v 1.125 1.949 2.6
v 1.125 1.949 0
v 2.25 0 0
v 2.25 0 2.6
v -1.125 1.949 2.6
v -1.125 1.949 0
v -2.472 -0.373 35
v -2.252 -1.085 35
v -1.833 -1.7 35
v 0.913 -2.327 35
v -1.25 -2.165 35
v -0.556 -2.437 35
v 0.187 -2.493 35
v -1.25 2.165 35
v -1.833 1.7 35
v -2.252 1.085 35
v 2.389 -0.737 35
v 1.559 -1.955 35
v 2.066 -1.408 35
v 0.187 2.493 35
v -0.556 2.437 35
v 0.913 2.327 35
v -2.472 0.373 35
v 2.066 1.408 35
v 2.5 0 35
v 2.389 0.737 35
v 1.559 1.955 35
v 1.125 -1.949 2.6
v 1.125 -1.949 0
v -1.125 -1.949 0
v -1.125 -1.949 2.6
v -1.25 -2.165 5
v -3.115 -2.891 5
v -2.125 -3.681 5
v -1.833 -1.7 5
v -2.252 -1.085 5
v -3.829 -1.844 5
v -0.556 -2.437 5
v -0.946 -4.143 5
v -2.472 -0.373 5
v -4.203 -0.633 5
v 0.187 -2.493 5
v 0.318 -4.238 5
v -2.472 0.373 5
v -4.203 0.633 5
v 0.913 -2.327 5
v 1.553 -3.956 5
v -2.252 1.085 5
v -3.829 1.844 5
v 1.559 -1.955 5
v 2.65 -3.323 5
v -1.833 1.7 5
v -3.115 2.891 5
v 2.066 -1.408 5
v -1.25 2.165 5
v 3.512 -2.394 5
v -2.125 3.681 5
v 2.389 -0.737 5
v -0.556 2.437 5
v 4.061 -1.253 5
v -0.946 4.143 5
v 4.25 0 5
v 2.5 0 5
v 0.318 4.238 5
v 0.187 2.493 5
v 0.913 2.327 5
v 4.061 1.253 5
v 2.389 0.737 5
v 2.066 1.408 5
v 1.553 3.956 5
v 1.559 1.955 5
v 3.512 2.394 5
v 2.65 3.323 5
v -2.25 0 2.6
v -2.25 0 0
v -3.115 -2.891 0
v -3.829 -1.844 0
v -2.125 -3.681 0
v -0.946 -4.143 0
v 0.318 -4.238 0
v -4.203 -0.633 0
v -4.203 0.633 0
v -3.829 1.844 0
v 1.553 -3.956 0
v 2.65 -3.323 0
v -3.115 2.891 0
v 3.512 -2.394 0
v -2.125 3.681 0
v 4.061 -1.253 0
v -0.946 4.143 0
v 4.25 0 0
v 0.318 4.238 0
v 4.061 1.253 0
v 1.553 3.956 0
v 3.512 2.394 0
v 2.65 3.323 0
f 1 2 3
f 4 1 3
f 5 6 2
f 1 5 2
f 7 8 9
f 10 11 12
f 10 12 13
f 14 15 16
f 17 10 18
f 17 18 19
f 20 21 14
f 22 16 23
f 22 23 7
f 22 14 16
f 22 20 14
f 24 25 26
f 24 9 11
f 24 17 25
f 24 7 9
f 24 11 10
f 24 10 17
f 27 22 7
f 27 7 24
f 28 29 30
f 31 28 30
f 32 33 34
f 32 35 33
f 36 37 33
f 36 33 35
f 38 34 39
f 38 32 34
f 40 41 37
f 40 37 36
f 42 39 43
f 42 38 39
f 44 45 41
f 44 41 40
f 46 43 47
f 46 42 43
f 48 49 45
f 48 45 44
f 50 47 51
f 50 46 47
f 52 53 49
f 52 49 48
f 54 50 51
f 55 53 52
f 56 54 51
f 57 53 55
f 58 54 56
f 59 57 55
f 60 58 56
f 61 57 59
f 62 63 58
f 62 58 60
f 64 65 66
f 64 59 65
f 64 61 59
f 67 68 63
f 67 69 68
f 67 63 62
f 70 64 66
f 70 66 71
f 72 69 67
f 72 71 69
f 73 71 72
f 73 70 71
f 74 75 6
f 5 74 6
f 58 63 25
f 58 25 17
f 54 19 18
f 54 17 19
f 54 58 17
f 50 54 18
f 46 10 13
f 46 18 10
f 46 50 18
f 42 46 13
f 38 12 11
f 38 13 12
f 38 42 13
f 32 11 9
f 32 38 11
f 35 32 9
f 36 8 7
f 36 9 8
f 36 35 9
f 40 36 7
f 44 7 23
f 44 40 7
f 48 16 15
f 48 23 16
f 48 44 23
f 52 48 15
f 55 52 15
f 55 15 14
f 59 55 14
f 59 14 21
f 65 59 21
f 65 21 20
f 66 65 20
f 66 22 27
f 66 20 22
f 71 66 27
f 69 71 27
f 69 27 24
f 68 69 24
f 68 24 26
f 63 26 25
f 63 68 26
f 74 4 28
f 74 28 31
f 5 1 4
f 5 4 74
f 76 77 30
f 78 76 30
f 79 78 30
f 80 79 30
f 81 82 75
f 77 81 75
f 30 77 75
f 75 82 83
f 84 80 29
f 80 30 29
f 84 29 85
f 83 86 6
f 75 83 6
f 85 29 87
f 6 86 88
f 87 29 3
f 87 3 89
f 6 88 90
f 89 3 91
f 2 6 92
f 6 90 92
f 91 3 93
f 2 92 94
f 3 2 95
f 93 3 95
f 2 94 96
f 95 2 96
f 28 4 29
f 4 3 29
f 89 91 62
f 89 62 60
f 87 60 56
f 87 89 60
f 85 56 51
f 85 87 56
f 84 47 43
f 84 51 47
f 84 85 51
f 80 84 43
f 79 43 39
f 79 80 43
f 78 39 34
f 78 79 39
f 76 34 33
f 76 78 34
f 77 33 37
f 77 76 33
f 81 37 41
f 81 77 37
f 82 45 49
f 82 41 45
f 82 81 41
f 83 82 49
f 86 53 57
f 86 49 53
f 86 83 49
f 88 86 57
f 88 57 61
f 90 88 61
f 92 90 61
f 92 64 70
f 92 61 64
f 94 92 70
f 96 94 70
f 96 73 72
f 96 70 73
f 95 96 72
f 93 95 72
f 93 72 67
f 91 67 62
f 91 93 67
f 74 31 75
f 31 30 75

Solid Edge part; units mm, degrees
sketch "Sketch1" plane through (0, 0, 0) normal (0, 0, 1) x (1, 0, 0)
  circle A0 centre (0, 0) radius 4.25
  dimension "D1" = 8.5
extrude "Protrusion1" add sketch "Sketch1" along normal blind 5
sketch "Sketch2" plane through (0, 0, 5) normal (0, 0, 1) x (1, 0, 0)
  circle A0 centre (0, 0) radius 2.5
extrude "ExtrudedProtrusion_2" add sketch "Sketch2" along normal blind 30
sketch "Sketch3" plane through (0, 0, 0) normal (0, 0, -1) x (-1, 0, 0)
  line L0 (2.25, 0) -> (1.125, 1.9486)
  line L1 (1.125, 1.9486) -> (-1.125, 1.9486)
  line L2 (-1.125, 1.9486) -> (-2.25, 0)
  line L3 (-2.25, 0) -> (-1.125, -1.9486)
  line L4 (-1.125, -1.9486) -> (1.125, -1.9486)
  line L5 (1.125, -1.9486) -> (2.25, 0)
extrude "ExtrudedCutout_1" cut sketch "Sketch3" against normal blind 2.6
properties material "Stainless steel"
